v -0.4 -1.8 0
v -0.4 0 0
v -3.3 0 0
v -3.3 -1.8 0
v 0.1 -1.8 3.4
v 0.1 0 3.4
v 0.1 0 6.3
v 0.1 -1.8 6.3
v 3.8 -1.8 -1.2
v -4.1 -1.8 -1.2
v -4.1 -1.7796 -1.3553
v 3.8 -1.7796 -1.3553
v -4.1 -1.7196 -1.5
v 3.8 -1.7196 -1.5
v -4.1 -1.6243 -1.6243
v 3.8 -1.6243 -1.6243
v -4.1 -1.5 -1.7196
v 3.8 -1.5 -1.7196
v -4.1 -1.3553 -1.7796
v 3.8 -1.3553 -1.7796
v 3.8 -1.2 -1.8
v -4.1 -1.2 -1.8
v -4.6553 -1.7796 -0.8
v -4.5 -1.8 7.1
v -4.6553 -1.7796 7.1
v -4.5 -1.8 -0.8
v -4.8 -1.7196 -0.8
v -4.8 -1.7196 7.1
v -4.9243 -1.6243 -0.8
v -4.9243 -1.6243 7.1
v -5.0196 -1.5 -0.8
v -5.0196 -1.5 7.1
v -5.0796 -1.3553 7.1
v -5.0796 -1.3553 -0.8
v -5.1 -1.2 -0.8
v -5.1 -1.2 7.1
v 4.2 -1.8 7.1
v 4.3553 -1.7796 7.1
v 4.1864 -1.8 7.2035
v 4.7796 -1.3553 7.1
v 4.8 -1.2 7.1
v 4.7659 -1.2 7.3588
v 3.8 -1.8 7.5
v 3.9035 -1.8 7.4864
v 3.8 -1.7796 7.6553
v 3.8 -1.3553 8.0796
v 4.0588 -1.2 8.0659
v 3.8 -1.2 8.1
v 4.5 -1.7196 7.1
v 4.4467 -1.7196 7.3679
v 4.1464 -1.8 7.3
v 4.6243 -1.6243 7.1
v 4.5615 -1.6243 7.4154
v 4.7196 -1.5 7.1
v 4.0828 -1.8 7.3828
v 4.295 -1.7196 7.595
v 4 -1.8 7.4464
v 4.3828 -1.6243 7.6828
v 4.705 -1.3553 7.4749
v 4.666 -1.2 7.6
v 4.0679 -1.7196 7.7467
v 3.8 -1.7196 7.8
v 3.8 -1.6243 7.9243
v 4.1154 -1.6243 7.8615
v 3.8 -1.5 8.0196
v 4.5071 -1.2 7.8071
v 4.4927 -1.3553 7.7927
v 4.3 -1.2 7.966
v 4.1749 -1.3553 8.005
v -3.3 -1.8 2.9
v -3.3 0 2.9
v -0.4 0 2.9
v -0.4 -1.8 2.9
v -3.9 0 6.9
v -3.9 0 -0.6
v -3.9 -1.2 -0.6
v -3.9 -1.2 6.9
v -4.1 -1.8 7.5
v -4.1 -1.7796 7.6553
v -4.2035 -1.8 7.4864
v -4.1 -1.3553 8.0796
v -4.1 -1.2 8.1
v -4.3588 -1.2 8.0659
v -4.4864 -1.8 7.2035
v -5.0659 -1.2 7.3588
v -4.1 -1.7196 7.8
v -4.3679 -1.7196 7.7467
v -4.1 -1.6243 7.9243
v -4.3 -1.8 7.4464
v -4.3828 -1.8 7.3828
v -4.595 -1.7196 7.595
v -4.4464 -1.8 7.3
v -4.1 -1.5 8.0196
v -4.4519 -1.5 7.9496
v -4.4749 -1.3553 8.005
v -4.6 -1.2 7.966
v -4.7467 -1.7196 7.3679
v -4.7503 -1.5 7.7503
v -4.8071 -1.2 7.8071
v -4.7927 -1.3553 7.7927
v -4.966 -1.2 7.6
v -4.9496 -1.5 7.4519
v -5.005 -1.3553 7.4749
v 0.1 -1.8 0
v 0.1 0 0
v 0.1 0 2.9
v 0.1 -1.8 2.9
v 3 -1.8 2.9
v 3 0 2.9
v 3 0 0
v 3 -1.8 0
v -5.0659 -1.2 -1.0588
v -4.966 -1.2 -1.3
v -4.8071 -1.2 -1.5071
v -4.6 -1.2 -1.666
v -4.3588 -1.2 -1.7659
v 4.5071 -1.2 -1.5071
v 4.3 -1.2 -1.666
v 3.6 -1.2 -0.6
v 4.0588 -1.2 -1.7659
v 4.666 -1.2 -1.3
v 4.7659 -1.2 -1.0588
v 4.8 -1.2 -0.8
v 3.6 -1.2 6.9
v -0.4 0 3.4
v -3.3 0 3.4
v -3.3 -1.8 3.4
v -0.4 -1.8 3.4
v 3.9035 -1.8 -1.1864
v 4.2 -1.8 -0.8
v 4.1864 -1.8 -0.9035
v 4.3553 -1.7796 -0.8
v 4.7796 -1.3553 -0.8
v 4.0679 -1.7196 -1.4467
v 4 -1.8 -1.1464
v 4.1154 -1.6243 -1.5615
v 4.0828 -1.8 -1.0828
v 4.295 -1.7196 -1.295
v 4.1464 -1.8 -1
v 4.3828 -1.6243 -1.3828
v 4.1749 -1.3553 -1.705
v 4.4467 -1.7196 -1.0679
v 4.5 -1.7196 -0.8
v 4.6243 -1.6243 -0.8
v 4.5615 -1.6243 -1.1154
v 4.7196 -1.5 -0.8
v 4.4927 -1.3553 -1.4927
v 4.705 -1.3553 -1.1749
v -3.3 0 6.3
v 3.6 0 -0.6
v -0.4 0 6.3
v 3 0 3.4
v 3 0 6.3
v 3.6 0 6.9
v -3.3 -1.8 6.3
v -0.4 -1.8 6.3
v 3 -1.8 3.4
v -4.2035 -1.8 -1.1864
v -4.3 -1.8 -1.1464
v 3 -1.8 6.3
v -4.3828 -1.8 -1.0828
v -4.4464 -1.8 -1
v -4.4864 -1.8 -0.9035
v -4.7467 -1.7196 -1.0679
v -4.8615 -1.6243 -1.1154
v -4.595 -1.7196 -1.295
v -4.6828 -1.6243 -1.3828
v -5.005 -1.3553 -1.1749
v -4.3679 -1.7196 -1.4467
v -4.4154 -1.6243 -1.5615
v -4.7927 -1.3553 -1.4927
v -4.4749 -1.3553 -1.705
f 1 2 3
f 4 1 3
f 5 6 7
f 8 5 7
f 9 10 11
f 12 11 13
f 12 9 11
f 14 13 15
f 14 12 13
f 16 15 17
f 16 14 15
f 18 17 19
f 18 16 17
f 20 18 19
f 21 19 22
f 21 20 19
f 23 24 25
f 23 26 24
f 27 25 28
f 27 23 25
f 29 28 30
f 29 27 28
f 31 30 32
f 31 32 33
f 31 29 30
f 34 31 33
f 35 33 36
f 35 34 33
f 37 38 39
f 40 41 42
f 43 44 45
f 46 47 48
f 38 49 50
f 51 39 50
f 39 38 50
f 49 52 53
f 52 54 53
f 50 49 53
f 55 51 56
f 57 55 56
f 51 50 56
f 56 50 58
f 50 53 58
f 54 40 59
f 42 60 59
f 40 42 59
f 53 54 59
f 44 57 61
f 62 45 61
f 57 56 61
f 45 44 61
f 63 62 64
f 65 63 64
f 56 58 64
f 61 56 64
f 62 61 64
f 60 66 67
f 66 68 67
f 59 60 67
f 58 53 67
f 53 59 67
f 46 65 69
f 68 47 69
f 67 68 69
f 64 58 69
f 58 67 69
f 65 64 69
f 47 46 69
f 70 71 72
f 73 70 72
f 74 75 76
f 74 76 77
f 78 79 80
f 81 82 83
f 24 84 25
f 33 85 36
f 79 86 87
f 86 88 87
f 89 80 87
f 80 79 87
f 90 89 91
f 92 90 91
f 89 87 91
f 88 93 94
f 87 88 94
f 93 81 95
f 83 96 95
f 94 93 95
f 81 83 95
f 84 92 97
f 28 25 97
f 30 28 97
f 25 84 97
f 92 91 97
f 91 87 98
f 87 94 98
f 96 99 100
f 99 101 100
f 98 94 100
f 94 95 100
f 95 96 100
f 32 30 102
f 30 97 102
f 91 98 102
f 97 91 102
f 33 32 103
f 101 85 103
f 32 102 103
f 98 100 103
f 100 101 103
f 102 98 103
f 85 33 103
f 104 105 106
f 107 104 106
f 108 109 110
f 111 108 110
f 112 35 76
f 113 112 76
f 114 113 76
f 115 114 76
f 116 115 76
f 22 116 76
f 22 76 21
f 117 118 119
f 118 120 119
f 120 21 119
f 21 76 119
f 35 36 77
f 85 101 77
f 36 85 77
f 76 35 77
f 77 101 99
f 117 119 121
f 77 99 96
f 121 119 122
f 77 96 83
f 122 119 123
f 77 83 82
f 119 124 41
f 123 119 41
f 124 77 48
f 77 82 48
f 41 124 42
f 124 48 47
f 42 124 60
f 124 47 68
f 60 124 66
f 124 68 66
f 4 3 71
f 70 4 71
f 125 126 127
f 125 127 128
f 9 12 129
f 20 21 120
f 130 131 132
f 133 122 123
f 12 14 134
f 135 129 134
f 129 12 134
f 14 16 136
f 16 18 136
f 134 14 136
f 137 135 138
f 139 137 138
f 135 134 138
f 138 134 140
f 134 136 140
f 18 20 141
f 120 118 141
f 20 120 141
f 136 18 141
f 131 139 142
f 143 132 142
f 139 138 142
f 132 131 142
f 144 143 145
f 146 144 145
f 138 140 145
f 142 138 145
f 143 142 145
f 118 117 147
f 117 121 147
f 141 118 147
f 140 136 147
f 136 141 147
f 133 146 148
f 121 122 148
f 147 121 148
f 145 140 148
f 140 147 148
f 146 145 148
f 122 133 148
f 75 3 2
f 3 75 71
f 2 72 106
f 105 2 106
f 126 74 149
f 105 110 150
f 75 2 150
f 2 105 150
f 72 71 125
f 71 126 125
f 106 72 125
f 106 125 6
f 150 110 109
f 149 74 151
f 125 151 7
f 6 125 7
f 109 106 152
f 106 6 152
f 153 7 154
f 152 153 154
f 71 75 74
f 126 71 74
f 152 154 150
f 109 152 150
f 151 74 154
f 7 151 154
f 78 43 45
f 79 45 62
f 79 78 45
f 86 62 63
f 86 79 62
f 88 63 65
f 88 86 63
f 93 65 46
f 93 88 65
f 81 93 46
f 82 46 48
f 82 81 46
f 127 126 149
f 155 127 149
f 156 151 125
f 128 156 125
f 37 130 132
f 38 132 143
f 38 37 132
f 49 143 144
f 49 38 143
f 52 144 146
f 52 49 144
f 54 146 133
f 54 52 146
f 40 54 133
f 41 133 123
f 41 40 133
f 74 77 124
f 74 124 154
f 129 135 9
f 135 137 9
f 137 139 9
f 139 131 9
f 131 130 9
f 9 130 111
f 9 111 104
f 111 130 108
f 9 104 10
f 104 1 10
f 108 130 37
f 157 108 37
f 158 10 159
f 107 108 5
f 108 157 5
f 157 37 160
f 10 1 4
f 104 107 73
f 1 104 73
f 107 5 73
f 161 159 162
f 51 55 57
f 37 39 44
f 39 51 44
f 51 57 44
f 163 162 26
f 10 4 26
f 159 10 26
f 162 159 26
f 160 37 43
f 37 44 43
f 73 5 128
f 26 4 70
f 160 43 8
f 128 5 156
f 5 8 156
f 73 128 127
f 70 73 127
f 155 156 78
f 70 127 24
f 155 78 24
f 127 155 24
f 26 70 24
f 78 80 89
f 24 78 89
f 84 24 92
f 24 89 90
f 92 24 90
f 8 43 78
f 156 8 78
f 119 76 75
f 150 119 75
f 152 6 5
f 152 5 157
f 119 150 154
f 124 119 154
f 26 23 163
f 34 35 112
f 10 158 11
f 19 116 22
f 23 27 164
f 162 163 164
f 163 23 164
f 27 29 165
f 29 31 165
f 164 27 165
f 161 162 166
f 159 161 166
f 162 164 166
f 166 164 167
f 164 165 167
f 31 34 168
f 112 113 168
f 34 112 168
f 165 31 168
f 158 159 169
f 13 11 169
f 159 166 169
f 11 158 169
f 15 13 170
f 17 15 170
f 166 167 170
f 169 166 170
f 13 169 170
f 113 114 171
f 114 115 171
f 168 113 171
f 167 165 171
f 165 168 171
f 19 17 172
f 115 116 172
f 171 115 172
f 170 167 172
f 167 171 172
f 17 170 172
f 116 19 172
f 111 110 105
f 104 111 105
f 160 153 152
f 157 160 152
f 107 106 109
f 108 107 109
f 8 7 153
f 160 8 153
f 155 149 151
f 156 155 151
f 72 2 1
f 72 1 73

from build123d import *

# Parameters (mm, degrees)
F0_W     = 7.5
F0_H     = 7.5
F0_W_2   = 0.1
F0_H_2   = 0.1
F0_H_3   = 2.9
F0_W_3   = 0.3
F0_W_4   = 2.9
F1_DEPTH = 1.8
F2_W     = 0.6
F2_H     = 7.5
F3_DEPTH = 1.2
F4_W     = 0.6
F4_H     = 7.5
F5_DEPTH = 1.2
F7_DEPTH = 1.2
F9_DEPTH = 1.2
F10_R    = 1
F11_R    = 0.59999


# Not quite as in the source:
# - a fillet or chamfer is up to 0.001 mm smaller than in the source, because OpenCascade refuses the exact size


with BuildPart() as f1:
    # F0 (on Front) → F1 (new body)
    with BuildSketch(Plane.XZ):
        with Locations((-0.15, 3.15)):
            Rectangle(F0_W, F0_H)
        Polygon((-0.3, 3), (-0.3, 2.9), (-0.3, 0), (-0.4, 0), (-3.3, 0), (-3.3, 2.9), (-3.3, 3), (-0.4, 3), align=None, mode=Mode.SUBTRACT)
        Polygon((0.1, 0), (0, 0), (0, 2.9), (0, 3), (0.1, 3), (3, 3), (3, 2.9), (3, 0), align=None, mode=Mode.SUBTRACT)
        Polygon((0.1, 3.3), (0, 3.3), (-0.3, 3.3), (-0.4, 3.3), (-3.3, 3.3), (-3.3, 3.4), (-3.3, 6.3), (-0.4, 6.3), (-0.3, 6.3), (-0.3, 3.4), (0, 3.4), (0, 6.3), (0.1, 6.3), (3, 6.3), (3, 3.4), (3, 3.3), align=None, mode=Mode.SUBTRACT)
        with Locations((-0.35, 3.35)):
            Rectangle(F0_W_2, F0_H_2)
        with Locations((-0.35, 4.85)):
            Rectangle(F0_W_2, F0_H_3)
        with Locations((0.05, 3.35)):
            Rectangle(F0_W_2, F0_H_2)
        with Locations((0.05, 4.85)):
            Rectangle(F0_W_2, F0_H_3)
        with Locations((-0.15, 3.35)):
            Rectangle(F0_W_3, F0_H_2)
        with Locations((-1.85, 3.35)):
            Rectangle(F0_W_4, F0_H_2)
        with Locations((1.55, 3.35)):
            Rectangle(F0_W_4, F0_H_2)
        with Locations((1.55, 2.95)):
            Rectangle(F0_W_4, F0_H_2)
        with Locations((-1.85, 2.95)):
            Rectangle(F0_W_4, F0_H_2)
        with Locations((-0.35, 1.45)):
            Rectangle(F0_W_2, F0_H_3)
        with Locations((0.05, 1.45)):
            Rectangle(F0_W_2, F0_H_3)
        with Locations((0.05, 2.95)):
            Rectangle(F0_W_2, F0_H_2)
        with Locations((-0.35, 2.95)):
            Rectangle(F0_W_2, F0_H_2)
    extrude(amount=F1_DEPTH)

    # F2 (on face) → F3 (join)
    with BuildSketch(Plane(origin=(-3.9, 0, 0), x_dir=(0, -1, 0), z_dir=(-1, 0, 0))):
        with Locations((1.5, 3.15)):
            Rectangle(F2_W, F2_H)
    extrude(amount=F3_DEPTH)

    # F4 (on face) → F5 (join)
    with BuildSketch(Plane.YZ.offset(3.6)):
        with Locations((-1.5, 3.15)):
            Rectangle(F4_W, F4_H)
    extrude(amount=F5_DEPTH)

    # F6 (on face) → F7 (join)
    with BuildSketch(Plane.XY.offset(6.9)):
        Polygon((-5.1, -1.2), (-5.1, -1.2278293749), (-5.1, -1.8), (4.8, -1.8), (4.8, -1.2), (3.6, -1.2), (-3.9, -1.2), align=None)
    extrude(amount=F7_DEPTH)

    # F8 (on face) → F9 (join)
    with BuildSketch(Plane(origin=(0, 0, -0.6), x_dir=(1, 0, 0), z_dir=(0, 0, -1))):
        Polygon((3.6, 1.2), (4.8, 1.2), (4.8, 1.8), (-5.1, 1.8), (-5.1, 1.2), (-3.9, 1.2), align=None)
    extrude(amount=F9_DEPTH)

    # F10
    f10_edges = [f1.edges().sort_by_distance(p)[0] for p in [
        (-5.1, -1.5, -1.8),
        (4.8, -1.5, -1.8),
        (4.8, -1.5, 8.1),
        (-5.1, -1.5, 8.1),
    ]]
    fillet(f10_edges, radius=F10_R)

    # F11 (radius 0.6 in the source; OpenCascade refuses exactly that, so slightly less here)
    f11_edges = [f1.edges().sort_by_distance(p)[0] for p in [
        (-5.1, -1.8, 3.15),
    ]]
    fillet(f11_edges, radius=F11_R)


solid = f1.part
